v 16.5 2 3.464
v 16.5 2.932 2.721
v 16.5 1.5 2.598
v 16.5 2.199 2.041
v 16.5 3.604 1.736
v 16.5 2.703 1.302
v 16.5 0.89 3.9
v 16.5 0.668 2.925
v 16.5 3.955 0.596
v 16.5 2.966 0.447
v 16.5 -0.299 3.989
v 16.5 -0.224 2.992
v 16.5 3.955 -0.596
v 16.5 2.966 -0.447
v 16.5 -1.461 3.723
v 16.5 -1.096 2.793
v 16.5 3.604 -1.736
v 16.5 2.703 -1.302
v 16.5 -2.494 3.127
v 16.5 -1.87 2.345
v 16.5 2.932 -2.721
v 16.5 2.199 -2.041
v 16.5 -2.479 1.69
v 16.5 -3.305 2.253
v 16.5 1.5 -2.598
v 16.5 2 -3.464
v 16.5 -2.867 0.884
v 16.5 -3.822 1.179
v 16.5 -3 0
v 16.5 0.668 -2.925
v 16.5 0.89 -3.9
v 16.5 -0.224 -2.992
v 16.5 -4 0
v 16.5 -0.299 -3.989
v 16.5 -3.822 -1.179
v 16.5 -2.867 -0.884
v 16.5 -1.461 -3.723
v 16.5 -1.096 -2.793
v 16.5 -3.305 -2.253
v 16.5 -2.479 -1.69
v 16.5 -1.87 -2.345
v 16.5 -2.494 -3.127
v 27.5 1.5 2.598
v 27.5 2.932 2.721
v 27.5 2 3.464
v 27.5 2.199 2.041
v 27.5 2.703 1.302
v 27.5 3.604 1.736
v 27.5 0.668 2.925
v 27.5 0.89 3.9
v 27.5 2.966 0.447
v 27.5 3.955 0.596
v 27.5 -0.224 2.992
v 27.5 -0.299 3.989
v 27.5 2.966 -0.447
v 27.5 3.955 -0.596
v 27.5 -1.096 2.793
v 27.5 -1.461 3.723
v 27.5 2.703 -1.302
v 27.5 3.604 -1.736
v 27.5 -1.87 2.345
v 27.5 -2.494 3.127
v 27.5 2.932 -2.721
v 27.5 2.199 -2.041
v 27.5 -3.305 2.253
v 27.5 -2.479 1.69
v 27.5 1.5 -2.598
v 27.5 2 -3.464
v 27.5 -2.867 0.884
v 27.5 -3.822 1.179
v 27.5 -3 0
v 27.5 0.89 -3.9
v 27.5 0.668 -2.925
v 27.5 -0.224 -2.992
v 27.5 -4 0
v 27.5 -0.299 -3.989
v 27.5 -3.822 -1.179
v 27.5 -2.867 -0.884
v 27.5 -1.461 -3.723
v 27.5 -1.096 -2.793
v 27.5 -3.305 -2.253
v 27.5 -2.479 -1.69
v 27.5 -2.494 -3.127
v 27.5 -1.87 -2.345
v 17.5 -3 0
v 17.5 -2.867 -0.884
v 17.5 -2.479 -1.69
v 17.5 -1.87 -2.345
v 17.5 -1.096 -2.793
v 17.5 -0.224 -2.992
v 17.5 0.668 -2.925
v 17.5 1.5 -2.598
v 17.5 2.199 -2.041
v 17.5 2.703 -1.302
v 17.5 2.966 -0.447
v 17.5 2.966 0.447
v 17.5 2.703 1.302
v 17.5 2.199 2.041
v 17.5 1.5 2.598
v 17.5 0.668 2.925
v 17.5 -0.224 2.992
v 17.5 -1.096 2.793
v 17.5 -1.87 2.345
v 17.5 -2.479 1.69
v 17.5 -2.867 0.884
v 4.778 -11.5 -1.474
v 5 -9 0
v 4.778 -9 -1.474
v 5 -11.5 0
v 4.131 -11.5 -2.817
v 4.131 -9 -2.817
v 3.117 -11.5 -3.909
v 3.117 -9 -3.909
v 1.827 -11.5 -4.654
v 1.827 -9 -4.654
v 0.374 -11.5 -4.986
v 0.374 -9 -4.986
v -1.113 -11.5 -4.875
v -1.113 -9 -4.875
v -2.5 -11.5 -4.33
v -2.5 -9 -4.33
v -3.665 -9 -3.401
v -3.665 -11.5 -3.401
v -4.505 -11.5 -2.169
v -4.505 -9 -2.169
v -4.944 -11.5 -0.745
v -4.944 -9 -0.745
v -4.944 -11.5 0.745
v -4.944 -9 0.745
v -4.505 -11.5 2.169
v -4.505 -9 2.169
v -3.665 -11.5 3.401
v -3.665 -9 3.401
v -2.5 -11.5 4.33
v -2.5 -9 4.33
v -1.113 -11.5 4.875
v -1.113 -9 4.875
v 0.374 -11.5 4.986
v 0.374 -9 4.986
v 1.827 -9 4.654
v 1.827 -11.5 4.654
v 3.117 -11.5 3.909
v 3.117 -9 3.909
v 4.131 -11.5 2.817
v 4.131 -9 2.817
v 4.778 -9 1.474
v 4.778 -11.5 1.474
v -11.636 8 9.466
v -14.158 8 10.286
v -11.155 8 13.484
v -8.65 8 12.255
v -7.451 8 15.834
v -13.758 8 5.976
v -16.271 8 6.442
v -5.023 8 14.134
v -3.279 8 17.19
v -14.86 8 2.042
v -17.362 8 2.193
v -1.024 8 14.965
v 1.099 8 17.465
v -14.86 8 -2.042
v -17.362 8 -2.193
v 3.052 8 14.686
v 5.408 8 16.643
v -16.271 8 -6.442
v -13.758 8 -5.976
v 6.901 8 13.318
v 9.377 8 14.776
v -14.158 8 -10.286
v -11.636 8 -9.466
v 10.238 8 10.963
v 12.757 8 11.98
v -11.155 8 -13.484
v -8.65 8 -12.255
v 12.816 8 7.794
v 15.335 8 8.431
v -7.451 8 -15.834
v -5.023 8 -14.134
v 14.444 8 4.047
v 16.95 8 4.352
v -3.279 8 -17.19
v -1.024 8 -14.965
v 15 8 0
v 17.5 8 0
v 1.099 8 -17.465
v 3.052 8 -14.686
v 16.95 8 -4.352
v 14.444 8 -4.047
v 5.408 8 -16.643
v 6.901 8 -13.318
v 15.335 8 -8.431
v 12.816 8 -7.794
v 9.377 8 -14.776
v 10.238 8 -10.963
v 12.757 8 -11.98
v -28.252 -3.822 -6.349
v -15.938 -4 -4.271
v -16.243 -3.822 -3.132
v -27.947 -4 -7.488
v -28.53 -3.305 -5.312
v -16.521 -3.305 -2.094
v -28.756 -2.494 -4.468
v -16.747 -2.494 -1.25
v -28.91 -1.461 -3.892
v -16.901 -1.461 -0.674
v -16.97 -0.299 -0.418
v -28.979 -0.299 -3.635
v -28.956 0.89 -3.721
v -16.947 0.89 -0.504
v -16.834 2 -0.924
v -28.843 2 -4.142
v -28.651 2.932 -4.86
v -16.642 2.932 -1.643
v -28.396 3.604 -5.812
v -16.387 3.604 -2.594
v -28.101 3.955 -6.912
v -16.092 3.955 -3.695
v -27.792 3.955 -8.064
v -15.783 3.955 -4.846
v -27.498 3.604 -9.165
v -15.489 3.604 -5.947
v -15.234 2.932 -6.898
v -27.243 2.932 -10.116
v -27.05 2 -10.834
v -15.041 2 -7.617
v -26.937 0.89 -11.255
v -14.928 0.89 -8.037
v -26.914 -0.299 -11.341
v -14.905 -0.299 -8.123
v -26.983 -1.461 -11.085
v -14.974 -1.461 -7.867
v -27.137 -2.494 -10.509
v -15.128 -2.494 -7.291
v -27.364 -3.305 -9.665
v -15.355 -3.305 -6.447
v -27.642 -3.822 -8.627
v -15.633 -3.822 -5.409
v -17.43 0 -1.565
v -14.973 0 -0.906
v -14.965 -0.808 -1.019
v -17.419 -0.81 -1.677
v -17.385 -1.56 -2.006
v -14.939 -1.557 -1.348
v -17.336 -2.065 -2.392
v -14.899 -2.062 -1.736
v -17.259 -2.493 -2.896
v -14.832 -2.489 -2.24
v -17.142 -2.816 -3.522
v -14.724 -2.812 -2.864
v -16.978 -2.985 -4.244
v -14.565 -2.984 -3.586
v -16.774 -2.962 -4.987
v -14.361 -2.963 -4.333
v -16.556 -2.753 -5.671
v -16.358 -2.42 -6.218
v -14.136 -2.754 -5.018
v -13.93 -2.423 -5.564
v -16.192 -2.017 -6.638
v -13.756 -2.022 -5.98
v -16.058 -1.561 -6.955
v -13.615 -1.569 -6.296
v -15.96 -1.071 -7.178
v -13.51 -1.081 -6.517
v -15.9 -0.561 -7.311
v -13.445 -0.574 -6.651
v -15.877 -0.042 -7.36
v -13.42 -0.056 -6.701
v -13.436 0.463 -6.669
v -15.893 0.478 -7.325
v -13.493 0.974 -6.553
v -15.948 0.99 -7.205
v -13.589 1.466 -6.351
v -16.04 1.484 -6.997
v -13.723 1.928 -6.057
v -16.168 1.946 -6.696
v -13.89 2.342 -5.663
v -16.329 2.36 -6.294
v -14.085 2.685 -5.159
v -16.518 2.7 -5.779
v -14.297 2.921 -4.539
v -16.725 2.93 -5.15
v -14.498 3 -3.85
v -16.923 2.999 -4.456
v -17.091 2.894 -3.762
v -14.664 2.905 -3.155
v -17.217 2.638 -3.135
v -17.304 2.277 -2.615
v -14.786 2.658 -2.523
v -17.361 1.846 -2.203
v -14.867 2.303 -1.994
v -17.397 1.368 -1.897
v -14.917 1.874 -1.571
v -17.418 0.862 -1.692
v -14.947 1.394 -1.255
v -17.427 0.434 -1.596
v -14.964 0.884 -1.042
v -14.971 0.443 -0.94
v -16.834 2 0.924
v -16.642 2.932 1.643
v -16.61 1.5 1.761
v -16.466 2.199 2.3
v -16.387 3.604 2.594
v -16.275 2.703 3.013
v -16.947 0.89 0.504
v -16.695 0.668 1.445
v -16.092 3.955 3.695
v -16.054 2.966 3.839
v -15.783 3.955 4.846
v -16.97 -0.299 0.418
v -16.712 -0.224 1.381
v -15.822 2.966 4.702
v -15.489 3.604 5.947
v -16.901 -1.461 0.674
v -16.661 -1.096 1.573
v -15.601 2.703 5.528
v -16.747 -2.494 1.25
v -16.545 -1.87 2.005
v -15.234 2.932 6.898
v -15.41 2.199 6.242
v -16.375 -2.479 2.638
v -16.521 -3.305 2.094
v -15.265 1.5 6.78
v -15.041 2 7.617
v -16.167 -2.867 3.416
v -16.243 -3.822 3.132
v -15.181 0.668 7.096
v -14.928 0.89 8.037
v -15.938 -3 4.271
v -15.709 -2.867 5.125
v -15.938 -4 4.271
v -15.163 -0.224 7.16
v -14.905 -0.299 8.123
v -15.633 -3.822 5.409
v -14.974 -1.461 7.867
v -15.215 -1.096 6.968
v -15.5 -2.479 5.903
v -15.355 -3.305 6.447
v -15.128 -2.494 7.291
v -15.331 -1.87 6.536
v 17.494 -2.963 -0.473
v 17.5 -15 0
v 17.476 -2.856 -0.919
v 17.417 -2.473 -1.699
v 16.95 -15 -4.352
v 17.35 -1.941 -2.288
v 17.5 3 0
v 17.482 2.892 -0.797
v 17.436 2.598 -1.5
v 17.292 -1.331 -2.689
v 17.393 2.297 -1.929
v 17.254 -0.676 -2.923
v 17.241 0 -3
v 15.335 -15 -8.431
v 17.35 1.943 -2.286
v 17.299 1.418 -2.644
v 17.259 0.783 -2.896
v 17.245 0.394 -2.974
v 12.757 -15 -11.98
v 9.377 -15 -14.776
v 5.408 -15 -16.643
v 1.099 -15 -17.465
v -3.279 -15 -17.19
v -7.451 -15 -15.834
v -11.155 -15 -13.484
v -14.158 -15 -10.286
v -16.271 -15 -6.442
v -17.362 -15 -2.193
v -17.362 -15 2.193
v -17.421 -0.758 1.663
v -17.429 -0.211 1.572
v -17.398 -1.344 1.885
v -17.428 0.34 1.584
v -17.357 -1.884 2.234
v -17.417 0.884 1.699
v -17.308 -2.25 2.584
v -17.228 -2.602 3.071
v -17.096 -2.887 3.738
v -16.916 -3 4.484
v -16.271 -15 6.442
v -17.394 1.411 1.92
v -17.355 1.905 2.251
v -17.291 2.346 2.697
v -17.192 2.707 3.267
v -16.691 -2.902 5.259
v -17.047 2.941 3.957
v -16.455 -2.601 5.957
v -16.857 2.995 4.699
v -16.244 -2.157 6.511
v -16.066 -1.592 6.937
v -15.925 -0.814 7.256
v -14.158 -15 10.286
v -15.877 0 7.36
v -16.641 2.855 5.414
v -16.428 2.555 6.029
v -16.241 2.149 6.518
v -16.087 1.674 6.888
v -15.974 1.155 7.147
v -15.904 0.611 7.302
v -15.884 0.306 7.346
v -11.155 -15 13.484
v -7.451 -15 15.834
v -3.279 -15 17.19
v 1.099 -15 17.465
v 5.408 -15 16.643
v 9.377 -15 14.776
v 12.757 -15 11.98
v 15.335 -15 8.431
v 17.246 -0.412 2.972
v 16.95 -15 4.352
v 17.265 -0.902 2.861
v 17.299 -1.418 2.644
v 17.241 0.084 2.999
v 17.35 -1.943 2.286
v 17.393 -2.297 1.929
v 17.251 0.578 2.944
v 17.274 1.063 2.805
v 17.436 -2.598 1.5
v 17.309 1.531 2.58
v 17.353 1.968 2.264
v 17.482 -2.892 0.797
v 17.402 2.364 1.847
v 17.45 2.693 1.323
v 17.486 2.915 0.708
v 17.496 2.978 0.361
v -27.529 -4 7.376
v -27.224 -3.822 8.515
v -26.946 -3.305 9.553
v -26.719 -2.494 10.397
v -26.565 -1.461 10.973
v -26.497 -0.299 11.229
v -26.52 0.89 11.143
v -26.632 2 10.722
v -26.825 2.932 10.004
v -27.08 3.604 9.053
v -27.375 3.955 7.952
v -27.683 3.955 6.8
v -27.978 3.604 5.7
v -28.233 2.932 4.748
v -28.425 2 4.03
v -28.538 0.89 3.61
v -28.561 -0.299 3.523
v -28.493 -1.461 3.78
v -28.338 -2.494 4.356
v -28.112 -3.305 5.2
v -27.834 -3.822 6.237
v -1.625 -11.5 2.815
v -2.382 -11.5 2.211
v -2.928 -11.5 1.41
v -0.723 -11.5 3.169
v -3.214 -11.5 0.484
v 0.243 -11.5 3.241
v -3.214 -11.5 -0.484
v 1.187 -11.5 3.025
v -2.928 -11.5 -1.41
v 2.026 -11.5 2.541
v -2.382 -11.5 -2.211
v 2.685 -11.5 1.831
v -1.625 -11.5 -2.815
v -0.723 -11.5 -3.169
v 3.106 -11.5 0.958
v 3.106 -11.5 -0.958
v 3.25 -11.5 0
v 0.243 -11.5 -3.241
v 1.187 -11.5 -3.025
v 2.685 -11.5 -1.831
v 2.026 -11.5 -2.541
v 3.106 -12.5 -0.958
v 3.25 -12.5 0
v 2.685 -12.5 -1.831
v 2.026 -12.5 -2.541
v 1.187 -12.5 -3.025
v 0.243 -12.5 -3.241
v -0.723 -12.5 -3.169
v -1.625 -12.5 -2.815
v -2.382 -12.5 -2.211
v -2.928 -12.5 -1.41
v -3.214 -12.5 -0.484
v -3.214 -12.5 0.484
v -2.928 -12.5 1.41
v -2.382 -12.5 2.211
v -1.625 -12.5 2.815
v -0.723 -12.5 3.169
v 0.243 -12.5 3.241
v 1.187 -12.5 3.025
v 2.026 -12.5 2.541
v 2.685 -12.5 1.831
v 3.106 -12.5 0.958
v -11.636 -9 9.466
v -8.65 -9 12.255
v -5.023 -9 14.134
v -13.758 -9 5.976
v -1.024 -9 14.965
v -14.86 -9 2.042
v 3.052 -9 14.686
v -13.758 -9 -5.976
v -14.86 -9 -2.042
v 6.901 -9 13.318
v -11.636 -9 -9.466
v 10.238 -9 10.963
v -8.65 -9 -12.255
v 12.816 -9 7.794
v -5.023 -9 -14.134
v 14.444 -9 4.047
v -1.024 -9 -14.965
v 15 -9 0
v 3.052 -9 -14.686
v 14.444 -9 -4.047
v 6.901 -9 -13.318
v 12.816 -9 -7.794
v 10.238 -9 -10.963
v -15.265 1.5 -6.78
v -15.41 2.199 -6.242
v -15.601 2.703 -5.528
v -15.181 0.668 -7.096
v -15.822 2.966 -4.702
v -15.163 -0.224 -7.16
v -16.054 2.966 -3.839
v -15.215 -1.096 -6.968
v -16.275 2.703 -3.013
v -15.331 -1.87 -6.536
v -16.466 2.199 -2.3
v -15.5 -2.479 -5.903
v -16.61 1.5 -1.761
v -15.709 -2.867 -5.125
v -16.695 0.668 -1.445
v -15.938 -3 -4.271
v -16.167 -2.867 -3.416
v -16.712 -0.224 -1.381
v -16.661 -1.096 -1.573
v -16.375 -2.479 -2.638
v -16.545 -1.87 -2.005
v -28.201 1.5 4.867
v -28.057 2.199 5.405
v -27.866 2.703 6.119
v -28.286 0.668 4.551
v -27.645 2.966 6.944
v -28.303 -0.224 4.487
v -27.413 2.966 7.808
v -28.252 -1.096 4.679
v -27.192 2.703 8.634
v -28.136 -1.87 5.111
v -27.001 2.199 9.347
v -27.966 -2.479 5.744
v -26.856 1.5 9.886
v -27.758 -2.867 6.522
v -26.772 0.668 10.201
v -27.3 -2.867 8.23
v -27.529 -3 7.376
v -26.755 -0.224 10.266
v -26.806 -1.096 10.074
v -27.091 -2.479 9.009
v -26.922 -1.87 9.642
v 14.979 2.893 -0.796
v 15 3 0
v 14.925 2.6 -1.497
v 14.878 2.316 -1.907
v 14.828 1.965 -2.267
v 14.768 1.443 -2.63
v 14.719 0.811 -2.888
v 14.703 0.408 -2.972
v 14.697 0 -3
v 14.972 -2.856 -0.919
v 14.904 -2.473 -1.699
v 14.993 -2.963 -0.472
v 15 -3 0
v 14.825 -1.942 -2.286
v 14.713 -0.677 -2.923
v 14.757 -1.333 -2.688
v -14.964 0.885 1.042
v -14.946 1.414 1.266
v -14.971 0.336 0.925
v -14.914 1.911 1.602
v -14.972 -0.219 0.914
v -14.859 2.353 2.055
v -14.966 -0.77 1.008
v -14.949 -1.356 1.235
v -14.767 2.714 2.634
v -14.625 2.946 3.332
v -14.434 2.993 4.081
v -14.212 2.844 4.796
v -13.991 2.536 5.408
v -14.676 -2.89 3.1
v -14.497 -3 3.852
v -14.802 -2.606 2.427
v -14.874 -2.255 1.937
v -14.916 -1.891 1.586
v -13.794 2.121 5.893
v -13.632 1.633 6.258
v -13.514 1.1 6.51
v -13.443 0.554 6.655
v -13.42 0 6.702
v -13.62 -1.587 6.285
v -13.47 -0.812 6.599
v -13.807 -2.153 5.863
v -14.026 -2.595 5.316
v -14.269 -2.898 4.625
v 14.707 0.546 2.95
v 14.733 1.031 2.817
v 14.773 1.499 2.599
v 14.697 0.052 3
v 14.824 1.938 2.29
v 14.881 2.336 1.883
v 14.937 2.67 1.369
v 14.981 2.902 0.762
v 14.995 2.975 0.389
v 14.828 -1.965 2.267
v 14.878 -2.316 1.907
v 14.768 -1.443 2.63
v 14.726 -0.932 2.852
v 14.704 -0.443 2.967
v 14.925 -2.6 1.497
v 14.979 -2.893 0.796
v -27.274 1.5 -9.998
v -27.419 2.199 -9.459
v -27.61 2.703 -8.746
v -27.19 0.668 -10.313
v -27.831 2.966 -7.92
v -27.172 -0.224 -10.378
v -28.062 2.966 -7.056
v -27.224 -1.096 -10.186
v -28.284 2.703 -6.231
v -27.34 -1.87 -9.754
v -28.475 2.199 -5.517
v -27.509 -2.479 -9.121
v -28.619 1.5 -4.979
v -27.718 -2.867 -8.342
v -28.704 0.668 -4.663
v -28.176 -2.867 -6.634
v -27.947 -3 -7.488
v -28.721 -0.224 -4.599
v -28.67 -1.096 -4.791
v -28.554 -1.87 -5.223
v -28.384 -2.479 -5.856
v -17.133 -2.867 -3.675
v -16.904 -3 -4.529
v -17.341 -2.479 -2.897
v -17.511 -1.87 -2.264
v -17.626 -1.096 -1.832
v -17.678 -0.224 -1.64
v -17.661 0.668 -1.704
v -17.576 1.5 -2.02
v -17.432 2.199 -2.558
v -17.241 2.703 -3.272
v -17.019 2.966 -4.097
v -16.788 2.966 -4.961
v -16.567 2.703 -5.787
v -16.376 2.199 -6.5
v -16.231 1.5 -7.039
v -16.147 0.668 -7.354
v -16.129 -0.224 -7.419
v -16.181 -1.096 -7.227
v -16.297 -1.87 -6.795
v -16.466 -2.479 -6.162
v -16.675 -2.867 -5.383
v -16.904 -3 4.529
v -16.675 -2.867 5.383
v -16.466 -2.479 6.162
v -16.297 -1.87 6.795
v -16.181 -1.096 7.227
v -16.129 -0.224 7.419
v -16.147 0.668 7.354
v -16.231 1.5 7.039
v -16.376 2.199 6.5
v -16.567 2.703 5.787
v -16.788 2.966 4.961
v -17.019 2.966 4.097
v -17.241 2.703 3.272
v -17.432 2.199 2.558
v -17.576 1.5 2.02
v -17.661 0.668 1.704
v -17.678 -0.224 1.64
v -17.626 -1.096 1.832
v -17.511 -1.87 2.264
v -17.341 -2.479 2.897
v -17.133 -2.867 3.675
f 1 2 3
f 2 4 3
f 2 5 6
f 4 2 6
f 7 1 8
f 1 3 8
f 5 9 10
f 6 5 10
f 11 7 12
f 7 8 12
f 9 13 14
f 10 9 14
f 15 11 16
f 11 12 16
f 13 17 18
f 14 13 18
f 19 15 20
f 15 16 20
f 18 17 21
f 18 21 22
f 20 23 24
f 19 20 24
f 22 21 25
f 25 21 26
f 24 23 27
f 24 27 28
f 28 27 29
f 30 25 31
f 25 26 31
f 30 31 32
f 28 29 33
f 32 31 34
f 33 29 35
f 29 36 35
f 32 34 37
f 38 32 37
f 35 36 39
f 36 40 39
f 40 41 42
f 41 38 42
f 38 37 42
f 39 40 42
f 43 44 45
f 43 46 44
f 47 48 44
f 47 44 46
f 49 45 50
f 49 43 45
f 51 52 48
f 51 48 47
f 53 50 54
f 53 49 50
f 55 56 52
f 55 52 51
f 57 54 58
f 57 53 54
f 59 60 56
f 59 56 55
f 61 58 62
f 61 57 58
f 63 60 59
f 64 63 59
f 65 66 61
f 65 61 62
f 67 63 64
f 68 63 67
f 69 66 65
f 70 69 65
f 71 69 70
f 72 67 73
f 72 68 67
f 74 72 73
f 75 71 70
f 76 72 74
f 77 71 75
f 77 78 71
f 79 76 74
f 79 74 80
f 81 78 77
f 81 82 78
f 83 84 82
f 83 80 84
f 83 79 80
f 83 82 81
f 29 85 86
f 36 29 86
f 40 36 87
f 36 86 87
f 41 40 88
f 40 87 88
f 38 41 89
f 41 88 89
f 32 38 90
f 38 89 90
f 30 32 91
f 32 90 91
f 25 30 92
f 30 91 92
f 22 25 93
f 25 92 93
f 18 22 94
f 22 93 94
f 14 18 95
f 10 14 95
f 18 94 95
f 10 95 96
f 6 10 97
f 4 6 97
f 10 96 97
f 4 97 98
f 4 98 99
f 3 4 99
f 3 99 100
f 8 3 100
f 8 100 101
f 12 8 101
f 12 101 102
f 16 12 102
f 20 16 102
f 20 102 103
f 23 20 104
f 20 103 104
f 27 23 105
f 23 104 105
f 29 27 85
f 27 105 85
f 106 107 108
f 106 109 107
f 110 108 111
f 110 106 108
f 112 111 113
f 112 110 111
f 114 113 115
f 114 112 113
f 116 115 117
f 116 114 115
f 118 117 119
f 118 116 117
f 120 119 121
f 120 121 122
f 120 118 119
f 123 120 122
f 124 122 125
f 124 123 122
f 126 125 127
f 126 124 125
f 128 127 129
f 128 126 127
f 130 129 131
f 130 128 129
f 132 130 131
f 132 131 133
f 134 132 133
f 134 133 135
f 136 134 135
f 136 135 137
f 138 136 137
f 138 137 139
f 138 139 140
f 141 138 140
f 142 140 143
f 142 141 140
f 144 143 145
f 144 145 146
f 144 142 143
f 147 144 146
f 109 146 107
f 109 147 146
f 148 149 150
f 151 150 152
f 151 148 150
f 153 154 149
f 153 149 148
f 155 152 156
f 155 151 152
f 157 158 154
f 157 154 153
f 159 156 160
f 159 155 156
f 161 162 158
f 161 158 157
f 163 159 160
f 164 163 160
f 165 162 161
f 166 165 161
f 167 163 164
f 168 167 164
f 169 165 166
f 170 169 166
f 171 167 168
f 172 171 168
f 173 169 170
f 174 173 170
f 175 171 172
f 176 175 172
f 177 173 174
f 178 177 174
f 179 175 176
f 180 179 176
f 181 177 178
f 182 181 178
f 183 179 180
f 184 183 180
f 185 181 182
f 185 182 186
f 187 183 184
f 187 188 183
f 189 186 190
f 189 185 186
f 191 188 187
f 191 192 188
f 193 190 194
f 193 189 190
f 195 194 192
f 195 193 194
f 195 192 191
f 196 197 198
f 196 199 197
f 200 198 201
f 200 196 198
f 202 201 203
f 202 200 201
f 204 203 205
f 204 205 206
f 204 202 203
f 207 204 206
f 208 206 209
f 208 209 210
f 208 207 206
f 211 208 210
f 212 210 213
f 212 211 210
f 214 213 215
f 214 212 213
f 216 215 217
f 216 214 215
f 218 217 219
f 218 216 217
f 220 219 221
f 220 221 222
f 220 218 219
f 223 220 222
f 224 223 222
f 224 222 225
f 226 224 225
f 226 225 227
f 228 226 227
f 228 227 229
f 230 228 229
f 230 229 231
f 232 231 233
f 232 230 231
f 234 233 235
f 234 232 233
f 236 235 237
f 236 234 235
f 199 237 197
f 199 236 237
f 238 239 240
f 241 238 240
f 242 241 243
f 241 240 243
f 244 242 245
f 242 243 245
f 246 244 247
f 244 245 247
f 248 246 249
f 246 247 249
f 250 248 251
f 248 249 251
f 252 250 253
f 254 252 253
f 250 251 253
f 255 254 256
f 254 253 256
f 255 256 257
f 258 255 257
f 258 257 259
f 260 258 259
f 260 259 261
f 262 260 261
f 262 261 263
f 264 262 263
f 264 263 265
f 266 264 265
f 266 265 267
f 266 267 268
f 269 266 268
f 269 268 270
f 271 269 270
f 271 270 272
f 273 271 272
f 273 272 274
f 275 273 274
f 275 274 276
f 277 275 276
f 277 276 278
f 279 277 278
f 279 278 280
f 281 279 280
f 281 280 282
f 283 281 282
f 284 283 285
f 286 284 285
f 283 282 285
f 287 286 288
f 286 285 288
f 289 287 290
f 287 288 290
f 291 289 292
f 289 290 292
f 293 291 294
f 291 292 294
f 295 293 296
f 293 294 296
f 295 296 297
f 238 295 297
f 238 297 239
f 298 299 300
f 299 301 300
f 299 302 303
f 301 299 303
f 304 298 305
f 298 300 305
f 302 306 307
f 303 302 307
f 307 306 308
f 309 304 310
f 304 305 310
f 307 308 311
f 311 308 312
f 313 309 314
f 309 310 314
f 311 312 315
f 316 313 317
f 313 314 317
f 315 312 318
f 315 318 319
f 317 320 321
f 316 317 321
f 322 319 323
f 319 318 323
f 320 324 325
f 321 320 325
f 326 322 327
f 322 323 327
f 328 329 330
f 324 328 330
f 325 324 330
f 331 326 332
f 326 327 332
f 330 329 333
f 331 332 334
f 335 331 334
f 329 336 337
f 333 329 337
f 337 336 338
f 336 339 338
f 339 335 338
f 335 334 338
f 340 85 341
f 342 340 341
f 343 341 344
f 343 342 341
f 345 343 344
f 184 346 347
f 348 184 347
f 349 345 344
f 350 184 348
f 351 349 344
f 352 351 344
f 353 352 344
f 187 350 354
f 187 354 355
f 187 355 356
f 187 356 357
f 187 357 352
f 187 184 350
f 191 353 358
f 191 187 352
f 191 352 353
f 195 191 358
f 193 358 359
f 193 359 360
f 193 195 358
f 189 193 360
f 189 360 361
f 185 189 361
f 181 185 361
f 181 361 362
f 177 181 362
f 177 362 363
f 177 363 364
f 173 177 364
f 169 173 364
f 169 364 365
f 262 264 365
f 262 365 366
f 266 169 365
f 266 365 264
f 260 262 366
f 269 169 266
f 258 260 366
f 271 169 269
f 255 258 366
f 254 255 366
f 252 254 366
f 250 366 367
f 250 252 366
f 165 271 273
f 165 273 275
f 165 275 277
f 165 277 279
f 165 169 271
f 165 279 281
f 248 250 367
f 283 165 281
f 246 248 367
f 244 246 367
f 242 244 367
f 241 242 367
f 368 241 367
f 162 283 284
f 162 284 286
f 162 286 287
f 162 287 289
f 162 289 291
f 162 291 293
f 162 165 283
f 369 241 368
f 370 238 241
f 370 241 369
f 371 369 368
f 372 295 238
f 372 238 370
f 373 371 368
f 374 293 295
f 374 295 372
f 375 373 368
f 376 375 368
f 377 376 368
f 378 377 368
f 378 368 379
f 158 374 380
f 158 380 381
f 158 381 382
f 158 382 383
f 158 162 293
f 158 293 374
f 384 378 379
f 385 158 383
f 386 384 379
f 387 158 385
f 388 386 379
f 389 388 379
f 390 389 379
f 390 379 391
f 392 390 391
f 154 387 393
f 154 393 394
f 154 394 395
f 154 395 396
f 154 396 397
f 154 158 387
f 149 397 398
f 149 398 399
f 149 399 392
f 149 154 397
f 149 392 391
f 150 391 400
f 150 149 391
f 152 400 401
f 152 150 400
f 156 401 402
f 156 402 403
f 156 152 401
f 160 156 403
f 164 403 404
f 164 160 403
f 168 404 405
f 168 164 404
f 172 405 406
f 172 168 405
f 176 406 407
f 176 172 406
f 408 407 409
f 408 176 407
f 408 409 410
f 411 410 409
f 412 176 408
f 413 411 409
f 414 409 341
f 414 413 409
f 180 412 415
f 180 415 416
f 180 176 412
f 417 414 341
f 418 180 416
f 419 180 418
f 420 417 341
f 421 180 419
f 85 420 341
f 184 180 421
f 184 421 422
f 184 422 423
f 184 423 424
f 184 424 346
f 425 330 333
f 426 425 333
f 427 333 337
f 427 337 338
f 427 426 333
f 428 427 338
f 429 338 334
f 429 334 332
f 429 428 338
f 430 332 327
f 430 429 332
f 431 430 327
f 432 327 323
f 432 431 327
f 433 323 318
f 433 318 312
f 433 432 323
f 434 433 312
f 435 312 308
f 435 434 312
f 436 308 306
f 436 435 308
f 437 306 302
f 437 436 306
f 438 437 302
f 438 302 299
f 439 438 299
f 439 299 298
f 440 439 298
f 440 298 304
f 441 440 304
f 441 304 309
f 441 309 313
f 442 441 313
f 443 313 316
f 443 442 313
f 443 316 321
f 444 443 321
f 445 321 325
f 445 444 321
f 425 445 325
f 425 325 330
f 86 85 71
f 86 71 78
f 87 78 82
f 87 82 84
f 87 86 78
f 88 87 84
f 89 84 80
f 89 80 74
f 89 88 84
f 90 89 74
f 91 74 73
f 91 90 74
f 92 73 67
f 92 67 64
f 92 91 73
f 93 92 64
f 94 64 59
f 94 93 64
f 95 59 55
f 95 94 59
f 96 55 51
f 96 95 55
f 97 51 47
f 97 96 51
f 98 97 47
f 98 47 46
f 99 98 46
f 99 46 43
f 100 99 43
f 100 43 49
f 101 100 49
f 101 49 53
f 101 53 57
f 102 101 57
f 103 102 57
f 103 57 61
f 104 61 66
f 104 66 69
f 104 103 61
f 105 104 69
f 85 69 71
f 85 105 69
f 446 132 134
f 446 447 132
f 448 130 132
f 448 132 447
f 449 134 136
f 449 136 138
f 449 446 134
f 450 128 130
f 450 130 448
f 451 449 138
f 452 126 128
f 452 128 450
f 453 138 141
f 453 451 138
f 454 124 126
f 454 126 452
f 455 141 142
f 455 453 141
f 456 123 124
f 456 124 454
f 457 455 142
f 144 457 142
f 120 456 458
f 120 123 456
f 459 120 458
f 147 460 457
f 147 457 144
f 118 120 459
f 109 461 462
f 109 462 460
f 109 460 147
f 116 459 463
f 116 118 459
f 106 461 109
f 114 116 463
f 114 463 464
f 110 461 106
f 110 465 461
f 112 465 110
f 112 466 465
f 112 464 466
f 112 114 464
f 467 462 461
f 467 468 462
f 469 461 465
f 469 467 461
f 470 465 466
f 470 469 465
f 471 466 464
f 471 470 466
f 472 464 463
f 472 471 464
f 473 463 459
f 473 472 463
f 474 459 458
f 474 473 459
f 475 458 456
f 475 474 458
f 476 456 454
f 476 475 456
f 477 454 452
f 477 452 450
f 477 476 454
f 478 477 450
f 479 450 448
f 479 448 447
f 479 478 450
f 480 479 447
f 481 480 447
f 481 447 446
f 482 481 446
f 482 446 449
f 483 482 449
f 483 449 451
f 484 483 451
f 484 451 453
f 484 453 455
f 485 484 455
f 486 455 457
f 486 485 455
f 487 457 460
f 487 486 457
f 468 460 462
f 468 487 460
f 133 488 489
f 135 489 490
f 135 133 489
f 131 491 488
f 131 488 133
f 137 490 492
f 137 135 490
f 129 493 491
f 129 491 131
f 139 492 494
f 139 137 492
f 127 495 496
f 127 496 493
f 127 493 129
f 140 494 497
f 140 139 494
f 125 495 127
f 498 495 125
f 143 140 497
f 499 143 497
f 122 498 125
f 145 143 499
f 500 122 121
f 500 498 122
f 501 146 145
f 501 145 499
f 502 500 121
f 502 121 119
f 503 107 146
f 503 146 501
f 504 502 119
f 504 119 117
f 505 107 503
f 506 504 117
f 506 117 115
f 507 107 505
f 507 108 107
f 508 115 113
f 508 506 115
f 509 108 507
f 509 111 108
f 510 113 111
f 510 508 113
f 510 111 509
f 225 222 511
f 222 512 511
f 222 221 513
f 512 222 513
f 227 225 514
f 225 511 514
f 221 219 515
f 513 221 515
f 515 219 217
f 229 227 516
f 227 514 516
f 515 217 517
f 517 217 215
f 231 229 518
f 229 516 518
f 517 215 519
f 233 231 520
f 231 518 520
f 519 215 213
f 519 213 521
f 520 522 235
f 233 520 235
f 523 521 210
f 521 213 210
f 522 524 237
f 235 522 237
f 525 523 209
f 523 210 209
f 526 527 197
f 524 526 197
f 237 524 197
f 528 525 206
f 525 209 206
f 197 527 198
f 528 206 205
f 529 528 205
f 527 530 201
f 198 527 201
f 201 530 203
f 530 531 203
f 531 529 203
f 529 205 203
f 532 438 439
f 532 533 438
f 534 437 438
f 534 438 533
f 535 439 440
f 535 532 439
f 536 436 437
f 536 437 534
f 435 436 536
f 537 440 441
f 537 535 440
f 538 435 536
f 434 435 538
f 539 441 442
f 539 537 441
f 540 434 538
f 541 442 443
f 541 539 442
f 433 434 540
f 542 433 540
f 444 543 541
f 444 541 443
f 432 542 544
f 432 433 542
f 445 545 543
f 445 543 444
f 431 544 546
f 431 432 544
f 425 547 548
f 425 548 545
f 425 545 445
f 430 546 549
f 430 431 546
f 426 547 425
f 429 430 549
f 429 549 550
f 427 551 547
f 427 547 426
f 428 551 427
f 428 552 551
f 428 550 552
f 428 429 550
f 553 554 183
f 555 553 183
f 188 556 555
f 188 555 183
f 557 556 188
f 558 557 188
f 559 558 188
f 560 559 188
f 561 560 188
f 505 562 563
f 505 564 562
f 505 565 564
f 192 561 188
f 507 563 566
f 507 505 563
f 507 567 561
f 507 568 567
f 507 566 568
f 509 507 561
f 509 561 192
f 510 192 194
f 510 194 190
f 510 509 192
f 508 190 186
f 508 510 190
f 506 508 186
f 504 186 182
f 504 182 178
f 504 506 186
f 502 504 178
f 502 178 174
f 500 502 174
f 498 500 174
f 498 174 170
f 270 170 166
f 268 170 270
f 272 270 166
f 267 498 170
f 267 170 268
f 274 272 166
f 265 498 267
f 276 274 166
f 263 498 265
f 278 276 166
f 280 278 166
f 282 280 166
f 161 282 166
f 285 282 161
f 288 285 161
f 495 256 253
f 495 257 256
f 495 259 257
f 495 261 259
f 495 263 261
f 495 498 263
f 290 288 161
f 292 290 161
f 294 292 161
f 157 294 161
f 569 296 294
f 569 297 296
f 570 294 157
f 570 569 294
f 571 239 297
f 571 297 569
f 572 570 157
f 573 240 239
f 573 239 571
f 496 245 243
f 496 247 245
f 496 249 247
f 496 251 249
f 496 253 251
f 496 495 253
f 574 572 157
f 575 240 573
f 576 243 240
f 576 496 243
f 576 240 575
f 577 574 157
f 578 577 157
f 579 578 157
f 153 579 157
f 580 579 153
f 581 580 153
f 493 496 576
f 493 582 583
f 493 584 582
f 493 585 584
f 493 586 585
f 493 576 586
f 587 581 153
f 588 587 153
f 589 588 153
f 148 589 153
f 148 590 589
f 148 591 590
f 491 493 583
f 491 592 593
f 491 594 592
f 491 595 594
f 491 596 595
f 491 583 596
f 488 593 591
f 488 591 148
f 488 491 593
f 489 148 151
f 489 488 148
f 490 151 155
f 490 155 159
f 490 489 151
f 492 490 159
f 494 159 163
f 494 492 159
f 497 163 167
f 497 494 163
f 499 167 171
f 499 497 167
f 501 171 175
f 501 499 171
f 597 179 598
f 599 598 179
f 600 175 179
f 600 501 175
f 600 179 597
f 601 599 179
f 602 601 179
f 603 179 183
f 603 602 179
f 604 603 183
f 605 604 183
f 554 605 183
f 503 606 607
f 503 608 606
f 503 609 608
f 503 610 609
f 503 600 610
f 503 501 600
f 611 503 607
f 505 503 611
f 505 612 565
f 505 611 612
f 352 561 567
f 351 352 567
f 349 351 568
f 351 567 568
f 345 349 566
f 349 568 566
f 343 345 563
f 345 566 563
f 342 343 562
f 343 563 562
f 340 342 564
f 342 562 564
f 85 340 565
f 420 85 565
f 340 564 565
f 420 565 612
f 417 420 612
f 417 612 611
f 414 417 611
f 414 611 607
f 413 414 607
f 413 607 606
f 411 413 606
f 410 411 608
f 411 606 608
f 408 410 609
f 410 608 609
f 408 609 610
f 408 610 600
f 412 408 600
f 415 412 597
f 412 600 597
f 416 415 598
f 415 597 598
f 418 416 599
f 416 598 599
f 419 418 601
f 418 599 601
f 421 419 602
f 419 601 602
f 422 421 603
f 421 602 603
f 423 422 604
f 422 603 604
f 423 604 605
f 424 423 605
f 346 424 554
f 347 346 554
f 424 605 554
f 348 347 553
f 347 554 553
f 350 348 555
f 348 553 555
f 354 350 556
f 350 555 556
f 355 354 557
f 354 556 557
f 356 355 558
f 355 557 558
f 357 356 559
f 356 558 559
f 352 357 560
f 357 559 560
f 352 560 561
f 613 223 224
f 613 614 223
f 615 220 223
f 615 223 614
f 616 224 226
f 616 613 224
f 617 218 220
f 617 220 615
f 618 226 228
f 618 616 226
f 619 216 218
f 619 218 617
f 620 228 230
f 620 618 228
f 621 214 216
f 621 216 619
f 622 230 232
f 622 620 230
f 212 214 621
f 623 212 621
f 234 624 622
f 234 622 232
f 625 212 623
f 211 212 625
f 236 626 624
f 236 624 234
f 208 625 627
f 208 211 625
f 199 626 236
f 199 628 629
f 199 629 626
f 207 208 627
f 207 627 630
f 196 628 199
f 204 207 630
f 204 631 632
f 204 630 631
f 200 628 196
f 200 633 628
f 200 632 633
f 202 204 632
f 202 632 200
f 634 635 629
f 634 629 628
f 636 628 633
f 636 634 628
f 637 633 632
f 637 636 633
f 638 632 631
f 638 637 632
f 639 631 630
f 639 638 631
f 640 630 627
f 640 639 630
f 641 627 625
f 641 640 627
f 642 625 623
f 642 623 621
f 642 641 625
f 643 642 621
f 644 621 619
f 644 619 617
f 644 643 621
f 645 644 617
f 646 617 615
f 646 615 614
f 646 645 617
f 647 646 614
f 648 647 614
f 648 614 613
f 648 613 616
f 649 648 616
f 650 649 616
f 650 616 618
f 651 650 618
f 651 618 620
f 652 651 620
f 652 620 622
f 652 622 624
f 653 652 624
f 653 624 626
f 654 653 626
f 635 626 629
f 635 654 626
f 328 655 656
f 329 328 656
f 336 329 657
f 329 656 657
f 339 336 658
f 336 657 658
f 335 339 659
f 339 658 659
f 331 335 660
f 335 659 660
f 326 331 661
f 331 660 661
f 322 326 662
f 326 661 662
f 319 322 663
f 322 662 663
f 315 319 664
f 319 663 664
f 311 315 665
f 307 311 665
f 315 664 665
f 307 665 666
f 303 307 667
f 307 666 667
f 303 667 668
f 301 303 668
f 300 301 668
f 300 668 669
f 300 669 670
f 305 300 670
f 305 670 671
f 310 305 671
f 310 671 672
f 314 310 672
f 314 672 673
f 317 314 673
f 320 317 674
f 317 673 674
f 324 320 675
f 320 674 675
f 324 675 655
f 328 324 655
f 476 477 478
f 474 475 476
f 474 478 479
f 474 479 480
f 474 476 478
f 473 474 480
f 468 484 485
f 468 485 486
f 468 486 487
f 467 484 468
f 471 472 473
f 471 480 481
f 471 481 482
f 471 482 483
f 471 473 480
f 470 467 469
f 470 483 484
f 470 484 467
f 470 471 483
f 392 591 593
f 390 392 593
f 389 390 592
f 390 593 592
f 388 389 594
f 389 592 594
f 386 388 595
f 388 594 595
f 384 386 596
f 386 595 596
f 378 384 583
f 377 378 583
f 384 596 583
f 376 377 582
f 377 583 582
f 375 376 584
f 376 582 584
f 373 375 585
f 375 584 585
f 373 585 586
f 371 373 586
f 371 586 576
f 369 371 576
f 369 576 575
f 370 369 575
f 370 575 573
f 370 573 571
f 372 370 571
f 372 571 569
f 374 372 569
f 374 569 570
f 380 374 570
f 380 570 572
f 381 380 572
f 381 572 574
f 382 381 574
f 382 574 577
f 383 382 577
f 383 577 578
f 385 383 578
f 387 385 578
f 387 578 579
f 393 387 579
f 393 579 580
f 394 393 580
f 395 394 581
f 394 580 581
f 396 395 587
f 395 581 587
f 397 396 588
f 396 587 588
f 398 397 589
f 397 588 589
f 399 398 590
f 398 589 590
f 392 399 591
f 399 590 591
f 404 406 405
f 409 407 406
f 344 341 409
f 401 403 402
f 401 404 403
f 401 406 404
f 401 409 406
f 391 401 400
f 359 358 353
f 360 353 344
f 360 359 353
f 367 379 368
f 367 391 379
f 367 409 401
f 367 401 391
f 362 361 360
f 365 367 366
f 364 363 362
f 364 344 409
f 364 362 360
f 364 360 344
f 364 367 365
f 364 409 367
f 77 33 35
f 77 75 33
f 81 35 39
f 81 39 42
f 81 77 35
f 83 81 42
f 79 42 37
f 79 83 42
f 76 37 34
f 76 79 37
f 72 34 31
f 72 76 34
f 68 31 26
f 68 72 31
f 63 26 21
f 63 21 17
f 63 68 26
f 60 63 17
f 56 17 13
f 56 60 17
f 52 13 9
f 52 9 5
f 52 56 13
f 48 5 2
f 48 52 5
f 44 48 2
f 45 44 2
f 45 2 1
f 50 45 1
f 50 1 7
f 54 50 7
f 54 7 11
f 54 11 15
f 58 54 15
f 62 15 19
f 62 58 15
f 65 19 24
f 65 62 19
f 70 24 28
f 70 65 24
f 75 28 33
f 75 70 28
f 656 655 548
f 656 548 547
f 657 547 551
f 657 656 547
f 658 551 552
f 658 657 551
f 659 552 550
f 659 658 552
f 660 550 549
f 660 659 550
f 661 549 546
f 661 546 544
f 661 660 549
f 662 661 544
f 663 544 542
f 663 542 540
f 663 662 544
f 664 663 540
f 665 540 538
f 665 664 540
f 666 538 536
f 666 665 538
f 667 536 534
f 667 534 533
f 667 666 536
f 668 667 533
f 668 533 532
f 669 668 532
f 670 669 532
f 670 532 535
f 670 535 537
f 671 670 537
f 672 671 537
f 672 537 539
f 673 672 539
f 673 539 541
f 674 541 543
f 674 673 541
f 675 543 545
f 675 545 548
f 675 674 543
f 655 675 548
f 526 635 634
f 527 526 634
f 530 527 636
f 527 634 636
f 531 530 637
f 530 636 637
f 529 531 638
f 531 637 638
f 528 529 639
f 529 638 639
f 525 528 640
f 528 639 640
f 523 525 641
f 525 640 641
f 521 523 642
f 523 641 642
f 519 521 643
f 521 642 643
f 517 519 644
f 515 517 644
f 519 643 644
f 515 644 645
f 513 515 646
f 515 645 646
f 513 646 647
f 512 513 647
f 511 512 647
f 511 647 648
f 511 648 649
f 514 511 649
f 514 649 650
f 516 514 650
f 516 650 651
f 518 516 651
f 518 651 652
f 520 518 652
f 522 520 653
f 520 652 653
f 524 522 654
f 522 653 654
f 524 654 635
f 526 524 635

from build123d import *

# Parameters (mm, degrees)
FUROS_GUIA_COM_6_0MM1_D       = 6
FUROS_GUIA_COM_6_0MM1_DEPTH   = 5
FUROS_GUIA_COM_6_0MM1_TIP     = 1.802581857
FUROS_GUIA_COM_6_0MM5_D       = 6
FUROS_GUIA_COM_6_0MM5_DEPTH   = 5
FUROS_GUIA_COM_6_0MM5_TIP     = 1.802581857
FUROS_GUIA_COM_6_0MM4_D       = 6
FUROS_GUIA_COM_6_0MM4_DEPTH   = 5
FUROS_GUIA_COM_6_0MM4_TIP     = 1.802581857
ESBO_O9_R                     = 4
ESBO_O9_R_2                   = 3
RESSALTO_EXTRUS_O1_DEPTH      = 11.432571
RESSALTO_EXTRUS_O1_DEPTH_BACK = 1
ESBO_O11_R                    = 4
ESBO_O11_R_2                  = 3
RESSALTO_EXTRUS_O2_DEPTH      = 11
RESSALTO_EXTRUS_O2_DEPTH_BACK = 1
ESBO_O13_R                    = 4
ESBO_O13_R_2                  = 3
RESSALTO_EXTRUS_O3_DEPTH      = 10
RESSALTO_EXTRUS_O3_DEPTH_BACK = 1


with BuildPart() as part:
    # Esboço1 → Revolução1 (revolve)
    with BuildSketch(Plane.XY):
        Polygon((0, -15), (17.5, -15), (17.5, 8), (15, 8), (15, -9), (5, -9), (5, -11.5), (3.25, -11.5), (3.25, -12.5), (0, -12.5), align=None)
    revolve(axis=Axis((0, 0, 0), (0, 1, 0)))

    # Furos-guia com Ø6.0mm1
    with Locations(Plane(origin=(17.5, 0, 0), x_dir=(0, 0, 1), z_dir=(1, 0, 0))):
        with Locations((0, 0)):
            Hole(FUROS_GUIA_COM_6_0MM1_D / 2, depth=FUROS_GUIA_COM_6_0MM1_DEPTH)
            with Locations((0, 0, -(FUROS_GUIA_COM_6_0MM1_DEPTH + FUROS_GUIA_COM_6_0MM1_TIP / 2))):  # 118° drill point
                Cone(0, FUROS_GUIA_COM_6_0MM1_D / 2, FUROS_GUIA_COM_6_0MM1_TIP, mode=Mode.SUBTRACT)

    # Furos-guia com Ø6.0mm5
    with Locations(Plane(origin=(-16.90370196, 0, -4.529333289), x_dir=(0.258819045, 0, -0.965925826), z_dir=(-0.965925826, 0, -0.258819045))):
        with Locations((0, 0)):
            Hole(FUROS_GUIA_COM_6_0MM5_D / 2, depth=FUROS_GUIA_COM_6_0MM5_DEPTH)
            with Locations((0, 0, -(FUROS_GUIA_COM_6_0MM5_DEPTH + FUROS_GUIA_COM_6_0MM5_TIP / 2))):  # 118° drill point
                Cone(0, FUROS_GUIA_COM_6_0MM5_D / 2, FUROS_GUIA_COM_6_0MM5_TIP, mode=Mode.SUBTRACT)

    # Furos-guia com Ø6.0mm4
    with Locations(Plane(origin=(-16.90370196, 0, 4.529333289), x_dir=(-0.258819045, 0, -0.965925826), z_dir=(-0.965925826, 0, 0.258819045))):
        with Locations((0, 0)):
            Hole(FUROS_GUIA_COM_6_0MM4_D / 2, depth=FUROS_GUIA_COM_6_0MM4_DEPTH)
            with Locations((0, 0, -(FUROS_GUIA_COM_6_0MM4_DEPTH + FUROS_GUIA_COM_6_0MM4_TIP / 2))):  # 118° drill point
                Cone(0, FUROS_GUIA_COM_6_0MM4_D / 2, FUROS_GUIA_COM_6_0MM4_TIP, mode=Mode.SUBTRACT)


with BuildPart() as body_2:
    # Esboço9 → Ressalto-extrusão1 (new body, two sides)
    with BuildSketch(Plane(origin=(-16.90370196, 0, -4.529333289), x_dir=(0, -1, 0), z_dir=(-0.965925826, 0, -0.258819045))) as ressalto_extrus_o1_sk:
        Circle(ESBO_O9_R)
        Circle(ESBO_O9_R_2, mode=Mode.SUBTRACT)
    extrude(amount=RESSALTO_EXTRUS_O1_DEPTH)
    extrude(ressalto_extrus_o1_sk.sketch, amount=-RESSALTO_EXTRUS_O1_DEPTH_BACK)


with BuildPart() as body_3:
    # Esboço11 → Ressalto-extrusão2 (new body, two sides)
    with BuildSketch(Plane(origin=(-16.90370196, 0, 4.529333289), x_dir=(0, -1, 0), z_dir=(-0.965925826, 0, 0.258819045))) as ressalto_extrus_o2_sk:
        Circle(ESBO_O11_R)
        Circle(ESBO_O11_R_2, mode=Mode.SUBTRACT)
    extrude(amount=RESSALTO_EXTRUS_O2_DEPTH)
    extrude(ressalto_extrus_o2_sk.sketch, amount=-RESSALTO_EXTRUS_O2_DEPTH_BACK)


with BuildPart() as body_4:
    # Esboço13 → Ressalto-extrusão3 (new body, two sides)
    with BuildSketch(Plane(origin=(17.5, 0, 0), x_dir=(0, -1, 0), z_dir=(1, 0, 0))) as ressalto_extrus_o3_sk:
        Circle(ESBO_O13_R)
        Circle(ESBO_O13_R_2, mode=Mode.SUBTRACT)
    extrude(amount=RESSALTO_EXTRUS_O3_DEPTH)
    extrude(ressalto_extrus_o3_sk.sketch, amount=-RESSALTO_EXTRUS_O3_DEPTH_BACK)


solid = Compound([part.part, body_2.part, body_3.part, body_4.part])
